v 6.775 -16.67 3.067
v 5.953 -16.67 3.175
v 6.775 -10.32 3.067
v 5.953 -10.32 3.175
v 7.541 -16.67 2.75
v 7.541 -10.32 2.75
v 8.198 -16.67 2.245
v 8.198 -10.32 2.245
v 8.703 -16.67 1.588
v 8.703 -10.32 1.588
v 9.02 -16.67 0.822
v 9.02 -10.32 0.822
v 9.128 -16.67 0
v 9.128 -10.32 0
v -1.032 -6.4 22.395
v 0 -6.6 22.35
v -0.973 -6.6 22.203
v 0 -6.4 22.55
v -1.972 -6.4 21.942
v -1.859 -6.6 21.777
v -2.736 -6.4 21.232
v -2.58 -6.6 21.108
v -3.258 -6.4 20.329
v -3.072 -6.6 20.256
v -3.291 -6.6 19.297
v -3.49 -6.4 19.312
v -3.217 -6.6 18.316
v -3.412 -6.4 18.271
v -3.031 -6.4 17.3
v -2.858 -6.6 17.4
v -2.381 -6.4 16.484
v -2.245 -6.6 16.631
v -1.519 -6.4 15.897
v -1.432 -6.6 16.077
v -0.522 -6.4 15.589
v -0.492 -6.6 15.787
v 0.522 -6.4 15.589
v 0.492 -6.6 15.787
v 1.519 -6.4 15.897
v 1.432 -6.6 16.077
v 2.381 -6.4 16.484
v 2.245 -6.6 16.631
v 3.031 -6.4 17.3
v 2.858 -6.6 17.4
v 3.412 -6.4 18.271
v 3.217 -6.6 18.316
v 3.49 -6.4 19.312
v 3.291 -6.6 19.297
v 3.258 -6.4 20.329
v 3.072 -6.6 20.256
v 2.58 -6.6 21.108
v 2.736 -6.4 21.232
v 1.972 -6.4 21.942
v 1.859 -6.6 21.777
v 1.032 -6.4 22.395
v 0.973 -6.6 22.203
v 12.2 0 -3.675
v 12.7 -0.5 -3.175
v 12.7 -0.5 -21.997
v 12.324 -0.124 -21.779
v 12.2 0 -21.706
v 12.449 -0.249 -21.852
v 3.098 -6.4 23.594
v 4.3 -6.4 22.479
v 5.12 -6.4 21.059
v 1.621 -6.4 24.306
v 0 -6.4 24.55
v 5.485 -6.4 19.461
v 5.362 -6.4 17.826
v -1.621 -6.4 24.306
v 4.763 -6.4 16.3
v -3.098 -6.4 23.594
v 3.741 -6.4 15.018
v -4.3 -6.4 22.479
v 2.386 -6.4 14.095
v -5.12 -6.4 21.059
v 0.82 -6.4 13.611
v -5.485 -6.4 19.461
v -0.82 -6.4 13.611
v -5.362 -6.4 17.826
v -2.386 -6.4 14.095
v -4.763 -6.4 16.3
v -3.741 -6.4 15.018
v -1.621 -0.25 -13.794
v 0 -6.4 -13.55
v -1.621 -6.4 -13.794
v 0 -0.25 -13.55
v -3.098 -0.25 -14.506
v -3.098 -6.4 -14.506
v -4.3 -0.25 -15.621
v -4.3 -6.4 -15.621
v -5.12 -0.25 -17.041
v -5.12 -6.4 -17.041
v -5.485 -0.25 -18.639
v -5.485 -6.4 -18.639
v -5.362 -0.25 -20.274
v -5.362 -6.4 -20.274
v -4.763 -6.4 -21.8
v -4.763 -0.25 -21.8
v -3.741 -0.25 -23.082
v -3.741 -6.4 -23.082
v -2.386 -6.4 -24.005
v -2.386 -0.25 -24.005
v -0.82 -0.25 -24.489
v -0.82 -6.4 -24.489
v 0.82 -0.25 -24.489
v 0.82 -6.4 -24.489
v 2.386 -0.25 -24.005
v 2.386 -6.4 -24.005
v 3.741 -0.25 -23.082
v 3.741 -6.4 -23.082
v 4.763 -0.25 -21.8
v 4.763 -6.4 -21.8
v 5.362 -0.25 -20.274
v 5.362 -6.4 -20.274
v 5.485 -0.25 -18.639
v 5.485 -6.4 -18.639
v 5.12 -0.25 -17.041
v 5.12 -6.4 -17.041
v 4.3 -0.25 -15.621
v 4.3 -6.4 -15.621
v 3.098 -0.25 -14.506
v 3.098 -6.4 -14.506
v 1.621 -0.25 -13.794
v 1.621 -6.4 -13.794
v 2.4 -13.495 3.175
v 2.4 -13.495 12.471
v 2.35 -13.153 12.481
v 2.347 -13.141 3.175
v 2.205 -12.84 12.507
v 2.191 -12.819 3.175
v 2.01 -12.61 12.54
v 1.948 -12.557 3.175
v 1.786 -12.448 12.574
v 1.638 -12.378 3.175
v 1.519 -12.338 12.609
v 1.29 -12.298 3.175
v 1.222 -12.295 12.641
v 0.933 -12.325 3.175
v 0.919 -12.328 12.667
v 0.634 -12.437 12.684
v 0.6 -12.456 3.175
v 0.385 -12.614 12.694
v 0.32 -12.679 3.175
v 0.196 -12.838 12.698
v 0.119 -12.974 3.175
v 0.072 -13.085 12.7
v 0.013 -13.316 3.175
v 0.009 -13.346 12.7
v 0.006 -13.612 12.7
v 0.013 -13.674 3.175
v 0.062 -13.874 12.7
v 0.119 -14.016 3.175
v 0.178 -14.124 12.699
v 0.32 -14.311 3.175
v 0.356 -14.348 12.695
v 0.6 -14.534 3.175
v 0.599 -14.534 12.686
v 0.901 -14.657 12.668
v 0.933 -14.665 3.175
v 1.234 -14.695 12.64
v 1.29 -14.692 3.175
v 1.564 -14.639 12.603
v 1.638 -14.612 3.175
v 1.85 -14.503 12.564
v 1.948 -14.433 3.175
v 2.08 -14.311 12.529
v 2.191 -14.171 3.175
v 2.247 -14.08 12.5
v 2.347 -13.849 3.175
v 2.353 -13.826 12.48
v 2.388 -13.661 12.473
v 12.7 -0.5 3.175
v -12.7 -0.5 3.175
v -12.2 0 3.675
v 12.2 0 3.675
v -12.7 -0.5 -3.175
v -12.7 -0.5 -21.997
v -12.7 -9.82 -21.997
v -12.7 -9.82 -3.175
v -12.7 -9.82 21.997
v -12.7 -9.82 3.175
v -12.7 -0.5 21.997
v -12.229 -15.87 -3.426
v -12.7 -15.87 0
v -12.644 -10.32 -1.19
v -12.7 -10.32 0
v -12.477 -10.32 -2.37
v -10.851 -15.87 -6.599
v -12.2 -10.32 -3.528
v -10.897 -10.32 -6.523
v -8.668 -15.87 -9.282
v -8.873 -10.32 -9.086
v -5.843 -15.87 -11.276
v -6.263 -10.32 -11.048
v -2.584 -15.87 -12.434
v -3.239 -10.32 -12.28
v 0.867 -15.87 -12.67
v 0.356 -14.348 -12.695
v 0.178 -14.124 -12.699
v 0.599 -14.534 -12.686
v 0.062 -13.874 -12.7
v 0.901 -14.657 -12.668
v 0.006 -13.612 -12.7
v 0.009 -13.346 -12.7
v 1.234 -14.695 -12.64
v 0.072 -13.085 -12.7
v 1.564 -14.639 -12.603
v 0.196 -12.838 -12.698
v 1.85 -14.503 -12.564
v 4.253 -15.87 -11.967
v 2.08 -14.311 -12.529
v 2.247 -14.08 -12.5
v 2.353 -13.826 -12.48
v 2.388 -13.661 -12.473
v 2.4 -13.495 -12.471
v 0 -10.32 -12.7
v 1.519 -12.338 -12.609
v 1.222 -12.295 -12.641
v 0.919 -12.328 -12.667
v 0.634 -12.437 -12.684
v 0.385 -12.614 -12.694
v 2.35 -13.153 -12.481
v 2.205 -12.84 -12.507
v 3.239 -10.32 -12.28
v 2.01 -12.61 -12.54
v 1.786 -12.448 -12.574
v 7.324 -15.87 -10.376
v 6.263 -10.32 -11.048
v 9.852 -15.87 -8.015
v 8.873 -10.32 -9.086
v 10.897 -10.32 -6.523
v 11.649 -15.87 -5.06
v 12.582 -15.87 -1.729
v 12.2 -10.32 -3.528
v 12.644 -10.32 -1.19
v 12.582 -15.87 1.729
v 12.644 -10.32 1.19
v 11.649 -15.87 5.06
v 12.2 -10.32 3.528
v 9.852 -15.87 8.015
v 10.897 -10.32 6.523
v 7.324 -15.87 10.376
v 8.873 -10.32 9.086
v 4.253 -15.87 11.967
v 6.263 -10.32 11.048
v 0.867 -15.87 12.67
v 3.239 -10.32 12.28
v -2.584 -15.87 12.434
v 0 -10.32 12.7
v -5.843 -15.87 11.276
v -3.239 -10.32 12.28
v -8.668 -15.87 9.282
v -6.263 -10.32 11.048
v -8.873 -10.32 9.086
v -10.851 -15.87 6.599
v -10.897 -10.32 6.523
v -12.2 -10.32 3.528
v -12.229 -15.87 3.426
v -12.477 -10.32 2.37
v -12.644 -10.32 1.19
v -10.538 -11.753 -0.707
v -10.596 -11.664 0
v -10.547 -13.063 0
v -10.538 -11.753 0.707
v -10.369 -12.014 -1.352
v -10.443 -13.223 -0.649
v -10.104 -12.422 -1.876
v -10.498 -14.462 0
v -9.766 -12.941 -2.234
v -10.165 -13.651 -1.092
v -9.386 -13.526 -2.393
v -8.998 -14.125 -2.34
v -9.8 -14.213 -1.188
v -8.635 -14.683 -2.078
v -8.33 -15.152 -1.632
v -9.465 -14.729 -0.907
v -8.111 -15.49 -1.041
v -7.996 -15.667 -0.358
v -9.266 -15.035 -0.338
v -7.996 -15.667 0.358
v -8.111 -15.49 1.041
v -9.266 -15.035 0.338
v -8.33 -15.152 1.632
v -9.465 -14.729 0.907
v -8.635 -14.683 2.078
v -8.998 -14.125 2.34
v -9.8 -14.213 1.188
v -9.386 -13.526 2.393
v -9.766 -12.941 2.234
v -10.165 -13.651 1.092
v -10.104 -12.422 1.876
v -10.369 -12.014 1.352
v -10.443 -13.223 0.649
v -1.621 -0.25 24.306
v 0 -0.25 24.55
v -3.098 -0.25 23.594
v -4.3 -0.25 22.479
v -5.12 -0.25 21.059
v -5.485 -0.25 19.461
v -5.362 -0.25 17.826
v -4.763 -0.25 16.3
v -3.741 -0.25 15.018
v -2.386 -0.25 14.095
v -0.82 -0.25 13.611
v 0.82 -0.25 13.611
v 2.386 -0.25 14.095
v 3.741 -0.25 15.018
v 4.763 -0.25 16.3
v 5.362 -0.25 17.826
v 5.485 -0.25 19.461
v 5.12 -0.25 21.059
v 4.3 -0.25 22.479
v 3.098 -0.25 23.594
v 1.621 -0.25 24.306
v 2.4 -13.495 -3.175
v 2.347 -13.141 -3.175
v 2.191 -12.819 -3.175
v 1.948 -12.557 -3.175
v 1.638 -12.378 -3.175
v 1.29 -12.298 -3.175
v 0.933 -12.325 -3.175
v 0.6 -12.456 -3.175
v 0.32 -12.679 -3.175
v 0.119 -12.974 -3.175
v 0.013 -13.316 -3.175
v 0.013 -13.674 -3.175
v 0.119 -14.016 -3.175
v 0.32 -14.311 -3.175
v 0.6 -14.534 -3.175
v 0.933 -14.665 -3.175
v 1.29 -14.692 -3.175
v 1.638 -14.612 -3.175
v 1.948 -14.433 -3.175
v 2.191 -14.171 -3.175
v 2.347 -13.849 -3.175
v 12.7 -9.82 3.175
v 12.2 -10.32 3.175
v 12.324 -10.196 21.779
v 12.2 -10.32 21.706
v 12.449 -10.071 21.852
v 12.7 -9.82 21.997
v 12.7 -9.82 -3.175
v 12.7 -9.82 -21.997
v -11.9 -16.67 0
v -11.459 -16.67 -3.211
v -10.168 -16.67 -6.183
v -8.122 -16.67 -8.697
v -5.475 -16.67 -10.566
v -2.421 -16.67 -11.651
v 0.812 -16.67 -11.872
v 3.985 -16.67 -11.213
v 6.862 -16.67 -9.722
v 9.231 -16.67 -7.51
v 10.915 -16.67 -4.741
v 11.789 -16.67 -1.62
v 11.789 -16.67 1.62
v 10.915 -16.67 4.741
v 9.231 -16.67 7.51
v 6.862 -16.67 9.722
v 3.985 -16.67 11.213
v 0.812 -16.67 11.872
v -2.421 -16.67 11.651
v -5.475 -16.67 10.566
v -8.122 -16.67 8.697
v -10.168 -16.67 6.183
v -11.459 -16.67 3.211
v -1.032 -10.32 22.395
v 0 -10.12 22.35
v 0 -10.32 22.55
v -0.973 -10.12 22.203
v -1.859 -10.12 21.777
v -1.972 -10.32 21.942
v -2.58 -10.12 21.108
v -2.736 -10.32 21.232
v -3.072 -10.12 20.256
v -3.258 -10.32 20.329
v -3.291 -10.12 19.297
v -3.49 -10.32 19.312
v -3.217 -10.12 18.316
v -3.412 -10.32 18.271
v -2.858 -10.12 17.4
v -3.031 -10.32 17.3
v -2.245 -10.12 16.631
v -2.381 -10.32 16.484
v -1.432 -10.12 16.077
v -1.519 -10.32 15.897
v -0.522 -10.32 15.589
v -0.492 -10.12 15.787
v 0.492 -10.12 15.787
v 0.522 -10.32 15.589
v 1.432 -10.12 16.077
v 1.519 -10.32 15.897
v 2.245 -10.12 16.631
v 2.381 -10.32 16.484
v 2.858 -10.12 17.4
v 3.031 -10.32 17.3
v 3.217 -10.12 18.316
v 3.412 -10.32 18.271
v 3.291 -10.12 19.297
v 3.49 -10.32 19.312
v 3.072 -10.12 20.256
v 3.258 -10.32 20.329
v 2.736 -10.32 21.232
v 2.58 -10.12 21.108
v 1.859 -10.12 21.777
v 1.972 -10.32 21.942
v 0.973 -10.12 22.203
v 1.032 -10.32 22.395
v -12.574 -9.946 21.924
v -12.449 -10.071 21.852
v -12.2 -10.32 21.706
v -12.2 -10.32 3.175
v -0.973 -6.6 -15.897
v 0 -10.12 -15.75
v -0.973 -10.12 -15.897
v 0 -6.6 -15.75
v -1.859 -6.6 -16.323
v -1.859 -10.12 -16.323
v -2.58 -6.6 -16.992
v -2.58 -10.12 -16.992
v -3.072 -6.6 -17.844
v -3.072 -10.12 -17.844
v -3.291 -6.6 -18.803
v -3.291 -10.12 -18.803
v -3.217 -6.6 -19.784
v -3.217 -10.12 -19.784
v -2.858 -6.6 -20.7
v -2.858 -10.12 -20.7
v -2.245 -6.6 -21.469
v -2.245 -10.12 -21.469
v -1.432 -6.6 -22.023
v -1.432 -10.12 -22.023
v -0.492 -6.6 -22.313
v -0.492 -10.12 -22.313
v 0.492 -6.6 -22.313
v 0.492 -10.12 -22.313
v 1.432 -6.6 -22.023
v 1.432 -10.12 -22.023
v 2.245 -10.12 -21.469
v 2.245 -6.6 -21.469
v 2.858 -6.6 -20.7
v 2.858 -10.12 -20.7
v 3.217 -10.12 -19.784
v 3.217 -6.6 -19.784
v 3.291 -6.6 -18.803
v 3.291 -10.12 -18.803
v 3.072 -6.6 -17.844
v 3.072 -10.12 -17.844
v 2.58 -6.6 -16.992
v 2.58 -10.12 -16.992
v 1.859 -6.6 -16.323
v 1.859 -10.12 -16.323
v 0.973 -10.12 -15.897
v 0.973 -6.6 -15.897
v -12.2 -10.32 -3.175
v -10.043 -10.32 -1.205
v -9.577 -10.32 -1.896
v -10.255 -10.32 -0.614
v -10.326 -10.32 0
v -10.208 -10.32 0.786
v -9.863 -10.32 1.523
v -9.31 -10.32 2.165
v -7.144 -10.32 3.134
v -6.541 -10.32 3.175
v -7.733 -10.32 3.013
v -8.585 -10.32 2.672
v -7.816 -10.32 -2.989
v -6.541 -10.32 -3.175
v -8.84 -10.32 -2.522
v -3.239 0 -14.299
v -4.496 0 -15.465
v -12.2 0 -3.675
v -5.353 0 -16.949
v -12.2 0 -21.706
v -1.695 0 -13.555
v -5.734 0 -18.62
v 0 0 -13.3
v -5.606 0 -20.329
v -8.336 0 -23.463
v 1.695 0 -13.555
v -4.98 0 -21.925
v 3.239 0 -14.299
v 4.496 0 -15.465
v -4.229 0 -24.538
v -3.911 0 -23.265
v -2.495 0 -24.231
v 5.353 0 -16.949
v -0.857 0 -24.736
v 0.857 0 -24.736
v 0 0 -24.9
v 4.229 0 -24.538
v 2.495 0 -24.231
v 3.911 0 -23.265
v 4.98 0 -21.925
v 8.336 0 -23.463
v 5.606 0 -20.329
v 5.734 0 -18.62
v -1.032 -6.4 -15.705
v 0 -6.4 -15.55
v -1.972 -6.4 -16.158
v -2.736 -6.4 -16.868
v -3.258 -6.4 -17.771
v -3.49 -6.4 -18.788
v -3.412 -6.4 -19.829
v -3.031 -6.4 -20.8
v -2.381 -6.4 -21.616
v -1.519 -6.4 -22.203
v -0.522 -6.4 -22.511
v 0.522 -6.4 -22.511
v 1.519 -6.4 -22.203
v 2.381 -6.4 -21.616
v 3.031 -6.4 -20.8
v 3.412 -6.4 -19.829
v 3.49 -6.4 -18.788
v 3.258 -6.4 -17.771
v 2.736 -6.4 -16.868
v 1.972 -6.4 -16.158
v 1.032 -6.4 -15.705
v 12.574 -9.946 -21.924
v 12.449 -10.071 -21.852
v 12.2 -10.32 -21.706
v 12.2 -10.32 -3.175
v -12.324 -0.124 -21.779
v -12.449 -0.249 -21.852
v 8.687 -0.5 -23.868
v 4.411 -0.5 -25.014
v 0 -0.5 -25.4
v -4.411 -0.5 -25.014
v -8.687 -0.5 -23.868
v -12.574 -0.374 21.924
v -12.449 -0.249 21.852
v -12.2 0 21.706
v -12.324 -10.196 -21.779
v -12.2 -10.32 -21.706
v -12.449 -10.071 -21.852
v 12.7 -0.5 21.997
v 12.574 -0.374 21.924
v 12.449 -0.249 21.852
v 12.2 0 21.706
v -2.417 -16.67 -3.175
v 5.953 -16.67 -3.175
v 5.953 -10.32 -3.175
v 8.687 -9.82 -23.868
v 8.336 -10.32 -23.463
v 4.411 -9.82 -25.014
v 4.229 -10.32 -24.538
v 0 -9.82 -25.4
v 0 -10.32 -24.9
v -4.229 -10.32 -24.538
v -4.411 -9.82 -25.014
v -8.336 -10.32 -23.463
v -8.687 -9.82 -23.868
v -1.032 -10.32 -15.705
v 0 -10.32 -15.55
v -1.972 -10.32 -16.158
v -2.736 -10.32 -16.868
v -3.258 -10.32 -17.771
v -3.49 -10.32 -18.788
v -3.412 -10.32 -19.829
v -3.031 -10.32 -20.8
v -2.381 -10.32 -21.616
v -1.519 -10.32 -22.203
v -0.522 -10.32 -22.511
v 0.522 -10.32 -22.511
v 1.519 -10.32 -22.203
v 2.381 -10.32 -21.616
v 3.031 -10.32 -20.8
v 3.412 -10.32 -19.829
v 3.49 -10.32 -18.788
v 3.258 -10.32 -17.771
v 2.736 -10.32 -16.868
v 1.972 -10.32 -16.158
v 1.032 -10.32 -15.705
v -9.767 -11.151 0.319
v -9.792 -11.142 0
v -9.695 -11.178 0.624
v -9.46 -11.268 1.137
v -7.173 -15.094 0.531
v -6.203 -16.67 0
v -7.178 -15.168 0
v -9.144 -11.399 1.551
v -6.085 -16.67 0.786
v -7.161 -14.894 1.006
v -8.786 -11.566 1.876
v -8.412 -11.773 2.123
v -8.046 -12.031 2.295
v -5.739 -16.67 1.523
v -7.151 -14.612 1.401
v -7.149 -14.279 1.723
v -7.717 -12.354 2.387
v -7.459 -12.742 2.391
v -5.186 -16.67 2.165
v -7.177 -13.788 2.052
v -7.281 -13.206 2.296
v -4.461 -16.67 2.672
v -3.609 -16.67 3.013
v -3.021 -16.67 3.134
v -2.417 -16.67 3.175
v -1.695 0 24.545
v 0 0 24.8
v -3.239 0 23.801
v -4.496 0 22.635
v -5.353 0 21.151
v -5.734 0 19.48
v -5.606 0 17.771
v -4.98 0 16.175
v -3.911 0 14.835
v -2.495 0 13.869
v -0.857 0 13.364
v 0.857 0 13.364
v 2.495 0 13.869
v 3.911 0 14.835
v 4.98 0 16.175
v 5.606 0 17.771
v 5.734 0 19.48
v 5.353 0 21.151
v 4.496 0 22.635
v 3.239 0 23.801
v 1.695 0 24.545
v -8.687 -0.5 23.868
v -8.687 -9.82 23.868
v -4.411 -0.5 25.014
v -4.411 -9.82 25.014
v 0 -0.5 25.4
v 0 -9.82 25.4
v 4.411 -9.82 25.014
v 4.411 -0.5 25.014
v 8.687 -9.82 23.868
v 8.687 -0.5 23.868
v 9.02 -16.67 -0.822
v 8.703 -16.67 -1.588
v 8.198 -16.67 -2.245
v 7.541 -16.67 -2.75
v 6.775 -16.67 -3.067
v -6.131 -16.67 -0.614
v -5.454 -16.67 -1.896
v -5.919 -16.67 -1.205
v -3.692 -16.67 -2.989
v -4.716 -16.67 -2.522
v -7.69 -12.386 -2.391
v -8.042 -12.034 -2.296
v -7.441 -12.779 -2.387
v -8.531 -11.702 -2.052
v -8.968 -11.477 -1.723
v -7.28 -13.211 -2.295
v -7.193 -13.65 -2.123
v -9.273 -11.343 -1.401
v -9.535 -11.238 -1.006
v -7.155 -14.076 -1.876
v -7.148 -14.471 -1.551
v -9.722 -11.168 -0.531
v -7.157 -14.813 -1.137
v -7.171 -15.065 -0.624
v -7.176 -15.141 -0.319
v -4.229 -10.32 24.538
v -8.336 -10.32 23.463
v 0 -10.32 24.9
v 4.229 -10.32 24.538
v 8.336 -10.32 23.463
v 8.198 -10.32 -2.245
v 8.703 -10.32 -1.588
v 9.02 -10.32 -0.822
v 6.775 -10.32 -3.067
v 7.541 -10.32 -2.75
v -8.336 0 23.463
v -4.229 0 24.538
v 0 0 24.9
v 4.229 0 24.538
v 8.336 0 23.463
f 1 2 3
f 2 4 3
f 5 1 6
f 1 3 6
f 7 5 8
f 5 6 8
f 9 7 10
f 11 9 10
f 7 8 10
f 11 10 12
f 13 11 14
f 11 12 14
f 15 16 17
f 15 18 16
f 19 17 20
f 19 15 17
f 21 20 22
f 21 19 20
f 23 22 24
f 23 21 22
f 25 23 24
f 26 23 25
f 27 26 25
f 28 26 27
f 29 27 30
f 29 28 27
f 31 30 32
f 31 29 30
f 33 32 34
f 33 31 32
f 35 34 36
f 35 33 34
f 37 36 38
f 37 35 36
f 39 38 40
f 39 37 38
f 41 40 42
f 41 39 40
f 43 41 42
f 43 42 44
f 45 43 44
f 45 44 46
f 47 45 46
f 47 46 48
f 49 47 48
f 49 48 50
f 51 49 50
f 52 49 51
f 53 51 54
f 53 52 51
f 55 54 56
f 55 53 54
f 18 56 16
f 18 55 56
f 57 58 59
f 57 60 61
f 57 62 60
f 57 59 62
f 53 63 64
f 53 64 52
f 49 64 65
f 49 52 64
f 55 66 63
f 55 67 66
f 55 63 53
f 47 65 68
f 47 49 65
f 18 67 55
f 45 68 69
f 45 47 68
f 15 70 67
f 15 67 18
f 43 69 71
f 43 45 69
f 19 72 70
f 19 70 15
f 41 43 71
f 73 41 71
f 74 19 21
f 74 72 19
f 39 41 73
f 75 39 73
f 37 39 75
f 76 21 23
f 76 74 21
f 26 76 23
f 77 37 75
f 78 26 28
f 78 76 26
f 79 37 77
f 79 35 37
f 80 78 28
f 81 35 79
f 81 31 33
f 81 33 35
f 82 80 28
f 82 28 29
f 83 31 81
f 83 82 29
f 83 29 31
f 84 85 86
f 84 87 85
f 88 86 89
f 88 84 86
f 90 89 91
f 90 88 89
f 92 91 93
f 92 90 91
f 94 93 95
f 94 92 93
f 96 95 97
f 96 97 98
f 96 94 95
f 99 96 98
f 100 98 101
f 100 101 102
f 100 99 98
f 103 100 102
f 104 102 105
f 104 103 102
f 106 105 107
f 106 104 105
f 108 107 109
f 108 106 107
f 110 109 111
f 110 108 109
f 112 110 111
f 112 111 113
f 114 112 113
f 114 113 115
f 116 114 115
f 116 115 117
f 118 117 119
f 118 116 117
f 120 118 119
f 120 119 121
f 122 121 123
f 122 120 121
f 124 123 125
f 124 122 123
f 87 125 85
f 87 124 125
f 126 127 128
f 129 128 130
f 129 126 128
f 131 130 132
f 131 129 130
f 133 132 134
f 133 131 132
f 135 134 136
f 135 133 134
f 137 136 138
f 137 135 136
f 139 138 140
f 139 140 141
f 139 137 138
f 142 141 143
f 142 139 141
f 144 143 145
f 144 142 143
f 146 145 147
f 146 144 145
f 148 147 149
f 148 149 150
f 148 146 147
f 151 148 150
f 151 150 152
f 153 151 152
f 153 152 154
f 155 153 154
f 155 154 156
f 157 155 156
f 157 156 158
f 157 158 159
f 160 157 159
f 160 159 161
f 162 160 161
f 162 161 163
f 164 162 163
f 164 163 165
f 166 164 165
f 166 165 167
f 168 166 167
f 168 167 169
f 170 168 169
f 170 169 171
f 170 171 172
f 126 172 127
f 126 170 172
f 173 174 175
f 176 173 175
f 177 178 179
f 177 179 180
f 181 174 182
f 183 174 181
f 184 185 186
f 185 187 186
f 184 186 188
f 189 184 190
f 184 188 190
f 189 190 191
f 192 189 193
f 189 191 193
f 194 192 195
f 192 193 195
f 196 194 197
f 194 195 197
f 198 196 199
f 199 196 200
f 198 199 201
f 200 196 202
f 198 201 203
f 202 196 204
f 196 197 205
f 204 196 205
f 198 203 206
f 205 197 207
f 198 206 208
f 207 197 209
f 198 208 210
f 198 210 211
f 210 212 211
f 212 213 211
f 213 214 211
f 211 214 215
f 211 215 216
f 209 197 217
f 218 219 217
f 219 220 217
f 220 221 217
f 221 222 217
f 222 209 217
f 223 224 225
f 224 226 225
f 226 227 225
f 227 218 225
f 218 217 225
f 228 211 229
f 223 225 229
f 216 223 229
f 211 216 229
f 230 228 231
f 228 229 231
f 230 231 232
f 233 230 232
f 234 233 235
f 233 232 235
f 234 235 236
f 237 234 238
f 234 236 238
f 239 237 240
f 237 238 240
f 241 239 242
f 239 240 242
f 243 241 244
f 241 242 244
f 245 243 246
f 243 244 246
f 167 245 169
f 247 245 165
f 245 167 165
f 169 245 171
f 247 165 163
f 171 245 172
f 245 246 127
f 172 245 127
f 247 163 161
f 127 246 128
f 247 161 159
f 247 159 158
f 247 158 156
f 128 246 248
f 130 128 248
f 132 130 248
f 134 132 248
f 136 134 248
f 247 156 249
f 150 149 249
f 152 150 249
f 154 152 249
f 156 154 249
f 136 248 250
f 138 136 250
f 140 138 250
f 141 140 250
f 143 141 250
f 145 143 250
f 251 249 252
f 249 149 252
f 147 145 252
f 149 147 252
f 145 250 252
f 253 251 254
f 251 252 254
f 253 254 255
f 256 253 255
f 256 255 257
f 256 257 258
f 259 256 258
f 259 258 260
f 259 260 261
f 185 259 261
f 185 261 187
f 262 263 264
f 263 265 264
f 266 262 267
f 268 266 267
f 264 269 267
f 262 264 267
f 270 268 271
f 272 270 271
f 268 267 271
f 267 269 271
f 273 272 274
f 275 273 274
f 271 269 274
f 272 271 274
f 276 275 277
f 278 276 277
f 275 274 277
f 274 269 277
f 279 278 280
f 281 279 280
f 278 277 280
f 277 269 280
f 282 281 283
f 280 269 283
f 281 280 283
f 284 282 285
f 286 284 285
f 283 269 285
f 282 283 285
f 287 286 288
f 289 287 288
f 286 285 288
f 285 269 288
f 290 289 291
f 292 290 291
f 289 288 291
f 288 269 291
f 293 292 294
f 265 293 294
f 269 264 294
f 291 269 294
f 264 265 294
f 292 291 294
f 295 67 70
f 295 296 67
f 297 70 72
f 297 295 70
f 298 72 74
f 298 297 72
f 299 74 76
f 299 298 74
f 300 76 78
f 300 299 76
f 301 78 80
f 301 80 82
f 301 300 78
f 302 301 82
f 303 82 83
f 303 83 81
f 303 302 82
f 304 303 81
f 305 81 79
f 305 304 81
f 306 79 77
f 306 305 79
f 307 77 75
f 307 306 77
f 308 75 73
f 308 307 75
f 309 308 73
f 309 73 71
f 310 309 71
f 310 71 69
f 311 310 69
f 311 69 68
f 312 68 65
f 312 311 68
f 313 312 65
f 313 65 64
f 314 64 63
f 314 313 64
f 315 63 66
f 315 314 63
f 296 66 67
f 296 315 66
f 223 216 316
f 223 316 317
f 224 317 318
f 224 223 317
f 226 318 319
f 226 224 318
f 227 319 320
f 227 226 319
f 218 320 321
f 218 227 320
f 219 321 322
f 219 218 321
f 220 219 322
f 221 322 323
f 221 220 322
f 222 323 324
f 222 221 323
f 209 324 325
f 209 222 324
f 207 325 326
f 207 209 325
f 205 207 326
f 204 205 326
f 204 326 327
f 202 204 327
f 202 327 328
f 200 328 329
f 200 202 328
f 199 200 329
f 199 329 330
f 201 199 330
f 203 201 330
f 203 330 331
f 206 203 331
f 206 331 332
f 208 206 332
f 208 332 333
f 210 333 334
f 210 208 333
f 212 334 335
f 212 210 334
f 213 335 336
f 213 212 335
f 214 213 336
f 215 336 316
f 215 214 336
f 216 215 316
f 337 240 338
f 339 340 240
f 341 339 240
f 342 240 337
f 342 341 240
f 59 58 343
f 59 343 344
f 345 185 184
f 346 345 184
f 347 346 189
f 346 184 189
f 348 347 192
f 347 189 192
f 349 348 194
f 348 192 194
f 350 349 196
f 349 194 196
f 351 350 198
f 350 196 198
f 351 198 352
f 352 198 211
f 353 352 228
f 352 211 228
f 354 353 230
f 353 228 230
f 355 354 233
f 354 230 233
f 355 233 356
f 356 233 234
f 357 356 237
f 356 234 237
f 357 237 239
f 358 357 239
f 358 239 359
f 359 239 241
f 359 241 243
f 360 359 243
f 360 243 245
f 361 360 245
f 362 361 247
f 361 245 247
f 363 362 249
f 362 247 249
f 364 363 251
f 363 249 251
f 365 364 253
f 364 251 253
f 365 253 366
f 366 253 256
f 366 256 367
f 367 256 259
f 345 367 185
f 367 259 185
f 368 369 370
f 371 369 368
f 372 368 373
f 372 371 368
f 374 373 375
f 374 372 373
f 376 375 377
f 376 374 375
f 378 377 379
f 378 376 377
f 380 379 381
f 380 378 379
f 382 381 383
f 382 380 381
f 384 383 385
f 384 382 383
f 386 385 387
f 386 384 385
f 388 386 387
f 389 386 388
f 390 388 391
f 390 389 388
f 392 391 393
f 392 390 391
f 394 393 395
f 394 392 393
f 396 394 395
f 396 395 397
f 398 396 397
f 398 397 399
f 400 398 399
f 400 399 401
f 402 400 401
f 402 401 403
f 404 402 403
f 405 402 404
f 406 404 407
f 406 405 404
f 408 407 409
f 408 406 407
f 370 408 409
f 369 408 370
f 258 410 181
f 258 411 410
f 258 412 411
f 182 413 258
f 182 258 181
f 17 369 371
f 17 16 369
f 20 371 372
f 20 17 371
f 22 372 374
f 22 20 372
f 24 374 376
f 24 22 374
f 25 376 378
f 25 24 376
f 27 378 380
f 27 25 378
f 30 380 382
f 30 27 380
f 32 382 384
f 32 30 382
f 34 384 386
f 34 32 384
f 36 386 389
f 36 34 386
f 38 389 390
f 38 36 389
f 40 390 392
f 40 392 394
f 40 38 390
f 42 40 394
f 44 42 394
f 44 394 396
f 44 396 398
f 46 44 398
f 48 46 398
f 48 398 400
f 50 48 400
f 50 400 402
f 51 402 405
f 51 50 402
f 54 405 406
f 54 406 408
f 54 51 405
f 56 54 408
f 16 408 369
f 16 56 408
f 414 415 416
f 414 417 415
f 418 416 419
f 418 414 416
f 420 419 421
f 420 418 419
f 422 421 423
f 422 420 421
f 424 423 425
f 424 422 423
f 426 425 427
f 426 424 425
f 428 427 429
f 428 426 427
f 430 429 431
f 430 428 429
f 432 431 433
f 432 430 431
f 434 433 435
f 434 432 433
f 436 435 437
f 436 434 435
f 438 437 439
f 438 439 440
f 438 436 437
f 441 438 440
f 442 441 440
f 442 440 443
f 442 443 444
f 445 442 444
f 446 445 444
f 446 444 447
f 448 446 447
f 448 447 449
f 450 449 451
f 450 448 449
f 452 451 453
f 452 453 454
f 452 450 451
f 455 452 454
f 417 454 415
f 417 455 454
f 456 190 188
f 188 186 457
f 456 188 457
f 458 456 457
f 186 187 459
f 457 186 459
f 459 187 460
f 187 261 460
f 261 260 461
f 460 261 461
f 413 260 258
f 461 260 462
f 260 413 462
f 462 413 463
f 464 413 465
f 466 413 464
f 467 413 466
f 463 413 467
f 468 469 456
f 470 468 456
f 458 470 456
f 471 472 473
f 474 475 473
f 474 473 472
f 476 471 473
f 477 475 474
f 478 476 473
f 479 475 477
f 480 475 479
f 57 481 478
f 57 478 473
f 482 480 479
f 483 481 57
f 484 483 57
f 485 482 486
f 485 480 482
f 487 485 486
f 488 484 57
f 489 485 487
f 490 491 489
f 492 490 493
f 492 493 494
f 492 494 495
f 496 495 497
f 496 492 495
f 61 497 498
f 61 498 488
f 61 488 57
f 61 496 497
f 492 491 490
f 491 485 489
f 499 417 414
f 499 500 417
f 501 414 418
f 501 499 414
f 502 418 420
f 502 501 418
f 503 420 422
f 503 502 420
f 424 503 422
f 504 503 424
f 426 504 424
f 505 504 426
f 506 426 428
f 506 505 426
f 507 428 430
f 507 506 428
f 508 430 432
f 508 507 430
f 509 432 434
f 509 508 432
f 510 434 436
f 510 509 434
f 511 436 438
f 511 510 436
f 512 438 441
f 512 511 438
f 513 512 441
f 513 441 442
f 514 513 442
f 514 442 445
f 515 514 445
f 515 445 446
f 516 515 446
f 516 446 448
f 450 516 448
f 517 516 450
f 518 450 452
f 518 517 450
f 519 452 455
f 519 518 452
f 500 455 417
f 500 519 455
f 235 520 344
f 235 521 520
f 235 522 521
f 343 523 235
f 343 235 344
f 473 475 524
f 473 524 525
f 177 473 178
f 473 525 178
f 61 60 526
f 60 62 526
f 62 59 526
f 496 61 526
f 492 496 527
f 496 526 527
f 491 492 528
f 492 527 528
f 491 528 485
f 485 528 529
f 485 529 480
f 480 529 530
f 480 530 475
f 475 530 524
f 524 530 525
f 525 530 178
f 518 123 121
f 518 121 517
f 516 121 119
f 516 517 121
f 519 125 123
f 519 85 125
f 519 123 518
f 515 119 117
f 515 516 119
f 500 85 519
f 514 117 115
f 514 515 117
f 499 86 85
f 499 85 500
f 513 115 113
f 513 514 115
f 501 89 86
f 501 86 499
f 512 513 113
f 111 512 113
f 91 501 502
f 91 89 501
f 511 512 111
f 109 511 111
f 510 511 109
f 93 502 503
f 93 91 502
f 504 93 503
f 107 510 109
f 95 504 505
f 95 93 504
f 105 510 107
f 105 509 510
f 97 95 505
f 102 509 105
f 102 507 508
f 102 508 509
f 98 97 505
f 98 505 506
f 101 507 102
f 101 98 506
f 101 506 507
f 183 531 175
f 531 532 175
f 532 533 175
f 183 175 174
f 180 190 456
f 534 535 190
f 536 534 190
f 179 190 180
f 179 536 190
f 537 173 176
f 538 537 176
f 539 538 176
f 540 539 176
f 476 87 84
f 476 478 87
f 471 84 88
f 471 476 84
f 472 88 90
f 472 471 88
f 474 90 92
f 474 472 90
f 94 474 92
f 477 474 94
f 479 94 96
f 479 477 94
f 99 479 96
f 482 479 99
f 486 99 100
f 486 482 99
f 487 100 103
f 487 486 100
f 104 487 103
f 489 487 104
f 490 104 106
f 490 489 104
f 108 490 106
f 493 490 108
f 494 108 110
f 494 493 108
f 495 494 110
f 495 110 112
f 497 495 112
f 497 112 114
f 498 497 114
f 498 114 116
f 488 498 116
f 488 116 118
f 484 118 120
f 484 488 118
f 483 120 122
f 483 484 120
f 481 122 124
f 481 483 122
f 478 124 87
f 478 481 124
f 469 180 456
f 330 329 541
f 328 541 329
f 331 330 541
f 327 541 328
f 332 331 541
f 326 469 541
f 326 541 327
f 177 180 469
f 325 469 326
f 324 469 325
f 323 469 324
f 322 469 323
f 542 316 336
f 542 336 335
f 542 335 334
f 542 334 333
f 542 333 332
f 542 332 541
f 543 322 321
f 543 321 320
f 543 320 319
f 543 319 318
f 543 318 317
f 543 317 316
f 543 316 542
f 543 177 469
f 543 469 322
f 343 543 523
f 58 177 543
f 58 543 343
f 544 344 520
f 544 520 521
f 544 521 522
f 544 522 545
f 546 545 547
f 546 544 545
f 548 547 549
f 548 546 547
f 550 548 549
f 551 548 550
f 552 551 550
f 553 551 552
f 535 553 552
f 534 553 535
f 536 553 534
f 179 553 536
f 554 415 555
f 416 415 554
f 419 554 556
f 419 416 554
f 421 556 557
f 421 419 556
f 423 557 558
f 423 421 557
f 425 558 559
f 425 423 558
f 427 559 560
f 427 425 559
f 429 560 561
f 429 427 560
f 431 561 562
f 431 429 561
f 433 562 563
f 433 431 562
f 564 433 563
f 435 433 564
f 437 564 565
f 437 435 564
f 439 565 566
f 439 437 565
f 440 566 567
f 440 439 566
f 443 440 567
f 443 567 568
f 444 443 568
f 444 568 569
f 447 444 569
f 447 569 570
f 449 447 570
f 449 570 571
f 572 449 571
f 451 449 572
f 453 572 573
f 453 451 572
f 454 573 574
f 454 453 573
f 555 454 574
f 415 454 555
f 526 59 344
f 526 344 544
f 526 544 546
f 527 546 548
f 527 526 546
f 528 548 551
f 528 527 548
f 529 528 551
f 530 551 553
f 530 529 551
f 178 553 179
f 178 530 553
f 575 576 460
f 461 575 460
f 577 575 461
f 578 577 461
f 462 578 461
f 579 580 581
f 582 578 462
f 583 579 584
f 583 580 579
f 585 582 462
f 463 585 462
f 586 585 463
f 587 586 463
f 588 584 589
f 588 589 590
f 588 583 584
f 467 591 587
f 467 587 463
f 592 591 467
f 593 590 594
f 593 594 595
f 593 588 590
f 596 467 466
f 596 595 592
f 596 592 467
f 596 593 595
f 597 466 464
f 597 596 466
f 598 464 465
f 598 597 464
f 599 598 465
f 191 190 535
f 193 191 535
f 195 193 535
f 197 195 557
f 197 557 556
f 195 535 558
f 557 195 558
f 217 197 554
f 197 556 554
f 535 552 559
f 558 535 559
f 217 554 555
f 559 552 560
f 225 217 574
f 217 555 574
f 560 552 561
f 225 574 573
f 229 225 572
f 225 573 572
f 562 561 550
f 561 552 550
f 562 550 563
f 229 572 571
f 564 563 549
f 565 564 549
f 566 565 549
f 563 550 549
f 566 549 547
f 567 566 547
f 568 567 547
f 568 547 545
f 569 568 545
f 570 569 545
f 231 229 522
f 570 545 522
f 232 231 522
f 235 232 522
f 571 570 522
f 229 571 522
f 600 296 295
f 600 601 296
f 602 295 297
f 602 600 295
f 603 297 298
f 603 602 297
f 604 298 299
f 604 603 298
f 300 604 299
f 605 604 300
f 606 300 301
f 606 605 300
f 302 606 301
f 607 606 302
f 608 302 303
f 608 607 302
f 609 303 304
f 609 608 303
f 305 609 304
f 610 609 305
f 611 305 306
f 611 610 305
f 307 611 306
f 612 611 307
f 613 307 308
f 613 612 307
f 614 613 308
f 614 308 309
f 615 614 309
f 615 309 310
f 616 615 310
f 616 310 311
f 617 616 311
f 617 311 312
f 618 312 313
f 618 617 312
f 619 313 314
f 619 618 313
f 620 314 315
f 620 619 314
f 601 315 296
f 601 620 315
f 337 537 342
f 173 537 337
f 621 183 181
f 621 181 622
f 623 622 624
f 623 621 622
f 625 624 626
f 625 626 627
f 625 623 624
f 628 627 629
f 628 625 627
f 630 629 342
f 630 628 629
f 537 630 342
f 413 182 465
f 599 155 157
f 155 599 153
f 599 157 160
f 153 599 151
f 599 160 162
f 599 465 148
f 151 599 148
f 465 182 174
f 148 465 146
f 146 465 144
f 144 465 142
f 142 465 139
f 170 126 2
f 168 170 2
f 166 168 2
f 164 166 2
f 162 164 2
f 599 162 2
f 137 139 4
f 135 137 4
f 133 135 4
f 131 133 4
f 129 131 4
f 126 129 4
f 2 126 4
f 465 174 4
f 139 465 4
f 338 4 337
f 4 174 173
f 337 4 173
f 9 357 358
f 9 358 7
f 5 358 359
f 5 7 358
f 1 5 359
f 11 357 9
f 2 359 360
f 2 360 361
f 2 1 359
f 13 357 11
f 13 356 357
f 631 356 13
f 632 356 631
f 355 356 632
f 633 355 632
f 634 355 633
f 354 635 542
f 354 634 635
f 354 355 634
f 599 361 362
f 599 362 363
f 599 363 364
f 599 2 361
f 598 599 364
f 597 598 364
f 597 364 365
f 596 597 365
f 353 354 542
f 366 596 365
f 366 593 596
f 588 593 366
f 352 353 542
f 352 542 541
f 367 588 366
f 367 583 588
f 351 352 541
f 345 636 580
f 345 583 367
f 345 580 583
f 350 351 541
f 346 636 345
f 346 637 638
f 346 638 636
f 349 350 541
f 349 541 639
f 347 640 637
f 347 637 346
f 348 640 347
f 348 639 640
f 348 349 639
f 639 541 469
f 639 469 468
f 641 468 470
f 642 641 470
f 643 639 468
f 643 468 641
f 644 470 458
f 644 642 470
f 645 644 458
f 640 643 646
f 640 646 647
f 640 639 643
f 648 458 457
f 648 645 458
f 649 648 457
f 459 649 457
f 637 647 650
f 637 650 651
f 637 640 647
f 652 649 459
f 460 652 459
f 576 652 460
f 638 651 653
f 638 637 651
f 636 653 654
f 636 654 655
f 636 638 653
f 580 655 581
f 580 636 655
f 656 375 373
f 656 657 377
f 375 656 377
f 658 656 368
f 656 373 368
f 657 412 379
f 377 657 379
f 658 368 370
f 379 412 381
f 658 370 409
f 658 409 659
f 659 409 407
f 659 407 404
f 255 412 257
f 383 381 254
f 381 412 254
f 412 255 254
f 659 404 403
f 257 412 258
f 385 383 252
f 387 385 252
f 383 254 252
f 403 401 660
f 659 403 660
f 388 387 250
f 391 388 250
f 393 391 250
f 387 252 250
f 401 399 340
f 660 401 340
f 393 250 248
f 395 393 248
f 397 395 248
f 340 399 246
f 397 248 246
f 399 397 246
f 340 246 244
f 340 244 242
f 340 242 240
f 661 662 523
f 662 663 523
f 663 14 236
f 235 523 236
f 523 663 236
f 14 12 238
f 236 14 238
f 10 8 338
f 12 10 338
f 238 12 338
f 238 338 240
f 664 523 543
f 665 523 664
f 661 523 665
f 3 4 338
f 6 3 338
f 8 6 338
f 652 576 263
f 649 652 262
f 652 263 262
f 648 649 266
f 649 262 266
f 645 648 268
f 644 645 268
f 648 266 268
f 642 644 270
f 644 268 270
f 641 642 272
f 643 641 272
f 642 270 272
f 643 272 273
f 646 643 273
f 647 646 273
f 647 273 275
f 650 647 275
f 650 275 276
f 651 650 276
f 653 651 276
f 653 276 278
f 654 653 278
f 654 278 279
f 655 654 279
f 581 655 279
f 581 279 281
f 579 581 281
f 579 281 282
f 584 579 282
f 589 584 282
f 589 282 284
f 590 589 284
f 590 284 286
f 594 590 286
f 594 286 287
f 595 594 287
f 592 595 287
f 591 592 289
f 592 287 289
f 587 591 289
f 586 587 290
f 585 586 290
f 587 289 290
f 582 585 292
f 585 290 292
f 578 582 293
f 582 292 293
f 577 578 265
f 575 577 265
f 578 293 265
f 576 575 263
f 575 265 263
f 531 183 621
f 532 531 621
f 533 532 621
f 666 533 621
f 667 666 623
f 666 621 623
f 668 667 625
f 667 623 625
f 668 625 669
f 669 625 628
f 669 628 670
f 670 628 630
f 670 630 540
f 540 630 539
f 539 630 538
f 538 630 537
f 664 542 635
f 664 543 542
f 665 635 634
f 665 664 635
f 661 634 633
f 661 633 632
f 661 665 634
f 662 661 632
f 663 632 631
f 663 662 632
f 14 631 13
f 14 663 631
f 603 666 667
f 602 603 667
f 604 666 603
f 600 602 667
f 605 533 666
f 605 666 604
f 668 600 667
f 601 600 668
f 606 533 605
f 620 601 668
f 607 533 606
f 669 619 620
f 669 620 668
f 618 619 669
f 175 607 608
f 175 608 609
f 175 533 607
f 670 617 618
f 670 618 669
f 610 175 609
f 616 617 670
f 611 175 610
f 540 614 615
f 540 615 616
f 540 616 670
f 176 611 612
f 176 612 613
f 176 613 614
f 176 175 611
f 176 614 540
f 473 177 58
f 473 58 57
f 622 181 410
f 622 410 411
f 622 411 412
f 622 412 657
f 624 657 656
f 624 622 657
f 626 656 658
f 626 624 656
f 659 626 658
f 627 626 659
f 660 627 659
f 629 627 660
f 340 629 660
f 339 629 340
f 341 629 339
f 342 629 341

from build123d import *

# Parameters (mm, degrees)
BOSS_EXTRUDE1_DEPTH                          = 10.32
SKETCH2_R                                    = 12.7
BOSS_EXTRUDE2_DEPTH                          = 6.35
CUT_EXTRUDE3_DEPTH                           = 33.929301541
CUT_EXTRUDE3_DEPTH_BACK                      = 33.929301541
SKETCH9_R                                    = 1.2
CUT_EXTRUDE4_DEPTH                           = 3.175
CBORE_FOR_M6_HEX_SOCKET_HEAD_CAP_SCR_2_COUNT = 2
CBORE_FOR_M6_HEX_SOCKET_HEAD_CAP_SCR_2_PITCH = 38.1
FILLET2_R                                    = 3.175
FILLET3_R                                    = 3.175
CHAMFER2_SIZE                                = 0.8
CHAMFER3_SIZE                                = 0.5


# Some blends are built 0.0001 mm under size
with BuildPart() as part:
    # Sketch1 → Boss-Extrude1 (new body)
    with BuildSketch(Plane(origin=(0, 0, 0), x_dir=(1, 0, 0), z_dir=(0, 1, 0))):
        with BuildLine():
            Line((-12.7, 21.997045256), (-12.7, -21.997045256))
            ThreePointArc((-12.7, -21.997045256), (0, -25.4), (12.7, -21.997045256))
            Line((12.7, -21.997045256), (12.7, 21.997045256))
            ThreePointArc((12.7, 21.997045256), (0, 25.4), (-12.7, 21.997045256))
        make_face()
    extrude(amount=-BOSS_EXTRUDE1_DEPTH)

    # Sketch2 → Boss-Extrude2 (add)
    with BuildSketch(Plane.XZ.offset(10.32)):
        with Locations(Location((0, 0, 0), (0, 0, 180))):
            Circle(SKETCH2_R)
    extrude(amount=BOSS_EXTRUDE2_DEPTH)

    # Sketch9 → Cut-Extrude3 (cut, two sides: drawn at the far end of the back side and taken through both)
    with BuildSketch(Plane.XY.offset(-CUT_EXTRUDE3_DEPTH_BACK)):
        with Locations((1.2, -13.495)):
            Circle(SKETCH9_R)
    extrude(amount=CUT_EXTRUDE3_DEPTH + CUT_EXTRUDE3_DEPTH_BACK, mode=Mode.SUBTRACT)

    # Sketch10 → Cut-Extrude4 (cut, symmetric)
    with BuildSketch(Plane.XY):
        Polygon((9.128125, -16.67), (9.128125, -10.32), (12.7, -10.32), (12.7, 0), (-12.7, 0), (-12.7, -10.32), (-10.326252745, -10.32), (-6.202514528, -16.67), align=None)
    extrude(amount=CUT_EXTRUDE4_DEPTH, both=True, mode=Mode.SUBTRACT)

    # Sketch13 → CBORE for M6 Hex Socket Head Cap Screw2 (revolve, cut)
    with BuildSketch(Plane(origin=(0, 0, -19.05), x_dir=(0, 0, 1), z_dir=(1, 0, 0))):
        Polygon((0, 0), (0, 10.32), (3.5, 10.32), (3.3, 10.12), (3.3, 6.6), (3.5, 6.4), (5.5, 6.4), (5.5, 0.25), (5.75, 0), align=None)
    cbore_for_m6_hex_socket_head_cap_screw2 = revolve(axis=Axis((0, 6.35, -19.05), (0, -1, 0)), mode=Mode.SUBTRACT)

    # CBORE for M6 Hex Socket Head Cap Scr 2: CBORE for M6 Hex Socket Head Cap Screw2 ×2
    with Locations(*[(0, 0, i * CBORE_FOR_M6_HEX_SOCKET_HEAD_CAP_SCR_2_PITCH) for i in range(1, CBORE_FOR_M6_HEX_SOCKET_HEAD_CAP_SCR_2_COUNT)]):
        add(cbore_for_m6_hex_socket_head_cap_screw2, mode=Mode.SUBTRACT)

    # Fillet2
    fillet2_edges = [part.edges().sort_by_distance(p)[0] for p in [
        (9.128125, -13.495, 3.175),
        (9.128125, -13.495, -3.175),
    ]]
    fillet(fillet2_edges, radius=FILLET2_R - 0.0001)  # a hair under: the kernel refuses the full size

    # Fillet3
    fillet3_edges = [part.edges().sort_by_distance(p)[0] for p in [
        (-8.264383637, -13.495, 3.175),
        (-8.264383637, -13.495, -3.175),
    ]]
    fillet(fillet3_edges, radius=FILLET3_R - 0.0001)  # a hair under: the kernel refuses the full size

    # Sketch14 → Cut-Revolve5 (revolve, cut)
    with BuildSketch(Plane.XY, mode=Mode.PRIVATE) as cut_revolve5_sk:
        Polygon((-2.984654144, -12.444678171), (-7.981398467, -15.689601875), (-10.497950031, -14.462197667), (-4.291787828, -10.431868808), align=None)
    revolve(cut_revolve5_sk.sketch.rotate(Axis((-8.485140668, -13.155063983, 0), (-0.8386705679454227, -0.5446390350150291, 0)), 180), axis=Axis((-8.485140668, -13.155063983, 0), (-0.8386705679454227, -0.5446390350150291, 0)), mode=Mode.SUBTRACT)

    # Chamfer2
    chamfer2_edges = [part.edges().sort_by_distance(p)[0] for p in [
        (12.7, -16.67, 0),
    ]]
    chamfer(chamfer2_edges, length=CHAMFER2_SIZE)

    # Chamfer3
    # the kernel refuses this chamfer: 0.5 mm, written as the material it takes off along each edge
    with BuildSketch(Plane(origin=(0, -10.32, 0), x_dir=(-0.5431897052031074, 0, 0.839609995272425), z_dir=(-0.839609995272425, 0, -0.5431897052031074))) as chamfer3_piece_1:
        Polygon((25.4 - CHAMFER3_SIZE, 0), (25.4, CHAMFER3_SIZE), (25.4, 0), align=None)
    revolve(axis=Axis((0, -10.32, 0), (0, 1, 0)), revolution_arc=65.802082053, mode=Mode.SUBTRACT)
    with BuildSketch(Plane(origin=(12.7, -10.32, 23.28288675), x_dir=(-0.9996219169112968, -0.027495876610585647, 0), z_dir=(0, 0, -1)), Plane(origin=(12.7, 0, -1.889158506), x_dir=(0.02749587661058563, -0.9996219169112968, 0), z_dir=(0, 0, -1)), Plane(origin=(12.7, -10.32, -1.889158506), x_dir=(-0.9996219169112968, -0.027495876610585647, 0), z_dir=(0, 0, -1)), Plane(origin=(-12.7, -10.32, 1.889158506), x_dir=(0.9996219169112968, -0.027495876610585647, 0), z_dir=(0, 0, 1)), Plane(origin=(12.7, 0, 23.28288675), x_dir=(0.02749587661058563, -0.9996219169112968, 0), z_dir=(0, 0, -1)), Plane(origin=(-12.7, -10.32, -23.28288675), x_dir=(0.9996219169112968, -0.027495876610585647, 0), z_dir=(0, 0, 1))) as chamfer3_piece_2:
        Polygon((CHAMFER3_SIZE * 0.999621916911, CHAMFER3_SIZE * 0.0274958766106), (-CHAMFER3_SIZE * 0.0274958766106, CHAMFER3_SIZE * 0.999621916911), (0, 0), align=None)
    extrude(amount=21.393728244, mode=Mode.SUBTRACT)
    with BuildSketch(Plane(origin=(-12.7, 0, 1.889158506), x_dir=(0.9996219169112968, 0.02749587661058639, 0), z_dir=(0, 0, 1)), Plane(origin=(-12.7, 0, -23.28288675), x_dir=(0.9996219169112968, 0.02749587661058639, 0), z_dir=(0, 0, 1))) as chamfer3_piece_3:
        Polygon((CHAMFER3_SIZE * 0.999621916911, -CHAMFER3_SIZE * 0.0274958766106), (-CHAMFER3_SIZE * 0.0274958766106, -CHAMFER3_SIZE * 0.999621916911), (0, 0), align=None)
    extrude(amount=21.393728244, mode=Mode.SUBTRACT)
    with BuildSketch(Plane(origin=(13.985841494, 0, 3.175), x_dir=(0, -0.9996219169112968, -0.027495876610586494), z_dir=(-1, 0, 0))) as chamfer3_piece_4:
        Polygon((CHAMFER3_SIZE * 0.999621916911, CHAMFER3_SIZE * 0.0274958766106), (-CHAMFER3_SIZE * 0.0274958766106, CHAMFER3_SIZE * 0.999621916911), (0, 0), align=None)
    extrude(amount=27.971682988, mode=Mode.SUBTRACT)
    with BuildSketch(Plane(origin=(13.985841494, 0, -3.175), x_dir=(0, -0.9996219169112968, 0.027495876610586494), z_dir=(-1, 0, 0))) as chamfer3_piece_5:
        Polygon((CHAMFER3_SIZE * 0.999621916911, -CHAMFER3_SIZE * 0.0274958766106), (-CHAMFER3_SIZE * 0.0274958766106, -CHAMFER3_SIZE * 0.999621916911), (0, 0), align=None)
    extrude(amount=27.971682988, mode=Mode.SUBTRACT)
    with BuildSketch(Plane(origin=(0, -10.32, 0), x_dir=(0.5431897052031078, 0, -0.8396099952724246), z_dir=(0.8396099952724246, 0, 0.5431897052031078))) as chamfer3_piece_6:
        Polygon((25.4 - CHAMFER3_SIZE, 0), (25.4, CHAMFER3_SIZE), (25.4, 0), align=None)
    revolve(axis=Axis((0, -10.32, 0), (0, 1, 0)), revolution_arc=65.802082053, mode=Mode.SUBTRACT)
    with BuildSketch(Plane(origin=(0, 0, 0), x_dir=(-0.5431897052031074, 0, 0.839609995272425), z_dir=(-0.839609995272425, 0, -0.5431897052031074))) as chamfer3_piece_7:
        Polygon((25.4 - CHAMFER3_SIZE, 0), (25.4, -CHAMFER3_SIZE), (25.4, 0), align=None)
    revolve(axis=Axis((0, 0, 0), (0, 1, 0)), revolution_arc=65.802082053, mode=Mode.SUBTRACT)
    with BuildSketch(Plane(origin=(0, 0, 0), x_dir=(0.5431897052031078, 0, -0.8396099952724246), z_dir=(0.8396099952724246, 0, 0.5431897052031078))) as chamfer3_piece_8:
        Polygon((25.4 - CHAMFER3_SIZE, 0), (25.4, -CHAMFER3_SIZE), (25.4, 0), align=None)
    revolve(axis=Axis((0, 0, 0), (0, 1, 0)), revolution_arc=65.802082053, mode=Mode.SUBTRACT)


solid = part.part
